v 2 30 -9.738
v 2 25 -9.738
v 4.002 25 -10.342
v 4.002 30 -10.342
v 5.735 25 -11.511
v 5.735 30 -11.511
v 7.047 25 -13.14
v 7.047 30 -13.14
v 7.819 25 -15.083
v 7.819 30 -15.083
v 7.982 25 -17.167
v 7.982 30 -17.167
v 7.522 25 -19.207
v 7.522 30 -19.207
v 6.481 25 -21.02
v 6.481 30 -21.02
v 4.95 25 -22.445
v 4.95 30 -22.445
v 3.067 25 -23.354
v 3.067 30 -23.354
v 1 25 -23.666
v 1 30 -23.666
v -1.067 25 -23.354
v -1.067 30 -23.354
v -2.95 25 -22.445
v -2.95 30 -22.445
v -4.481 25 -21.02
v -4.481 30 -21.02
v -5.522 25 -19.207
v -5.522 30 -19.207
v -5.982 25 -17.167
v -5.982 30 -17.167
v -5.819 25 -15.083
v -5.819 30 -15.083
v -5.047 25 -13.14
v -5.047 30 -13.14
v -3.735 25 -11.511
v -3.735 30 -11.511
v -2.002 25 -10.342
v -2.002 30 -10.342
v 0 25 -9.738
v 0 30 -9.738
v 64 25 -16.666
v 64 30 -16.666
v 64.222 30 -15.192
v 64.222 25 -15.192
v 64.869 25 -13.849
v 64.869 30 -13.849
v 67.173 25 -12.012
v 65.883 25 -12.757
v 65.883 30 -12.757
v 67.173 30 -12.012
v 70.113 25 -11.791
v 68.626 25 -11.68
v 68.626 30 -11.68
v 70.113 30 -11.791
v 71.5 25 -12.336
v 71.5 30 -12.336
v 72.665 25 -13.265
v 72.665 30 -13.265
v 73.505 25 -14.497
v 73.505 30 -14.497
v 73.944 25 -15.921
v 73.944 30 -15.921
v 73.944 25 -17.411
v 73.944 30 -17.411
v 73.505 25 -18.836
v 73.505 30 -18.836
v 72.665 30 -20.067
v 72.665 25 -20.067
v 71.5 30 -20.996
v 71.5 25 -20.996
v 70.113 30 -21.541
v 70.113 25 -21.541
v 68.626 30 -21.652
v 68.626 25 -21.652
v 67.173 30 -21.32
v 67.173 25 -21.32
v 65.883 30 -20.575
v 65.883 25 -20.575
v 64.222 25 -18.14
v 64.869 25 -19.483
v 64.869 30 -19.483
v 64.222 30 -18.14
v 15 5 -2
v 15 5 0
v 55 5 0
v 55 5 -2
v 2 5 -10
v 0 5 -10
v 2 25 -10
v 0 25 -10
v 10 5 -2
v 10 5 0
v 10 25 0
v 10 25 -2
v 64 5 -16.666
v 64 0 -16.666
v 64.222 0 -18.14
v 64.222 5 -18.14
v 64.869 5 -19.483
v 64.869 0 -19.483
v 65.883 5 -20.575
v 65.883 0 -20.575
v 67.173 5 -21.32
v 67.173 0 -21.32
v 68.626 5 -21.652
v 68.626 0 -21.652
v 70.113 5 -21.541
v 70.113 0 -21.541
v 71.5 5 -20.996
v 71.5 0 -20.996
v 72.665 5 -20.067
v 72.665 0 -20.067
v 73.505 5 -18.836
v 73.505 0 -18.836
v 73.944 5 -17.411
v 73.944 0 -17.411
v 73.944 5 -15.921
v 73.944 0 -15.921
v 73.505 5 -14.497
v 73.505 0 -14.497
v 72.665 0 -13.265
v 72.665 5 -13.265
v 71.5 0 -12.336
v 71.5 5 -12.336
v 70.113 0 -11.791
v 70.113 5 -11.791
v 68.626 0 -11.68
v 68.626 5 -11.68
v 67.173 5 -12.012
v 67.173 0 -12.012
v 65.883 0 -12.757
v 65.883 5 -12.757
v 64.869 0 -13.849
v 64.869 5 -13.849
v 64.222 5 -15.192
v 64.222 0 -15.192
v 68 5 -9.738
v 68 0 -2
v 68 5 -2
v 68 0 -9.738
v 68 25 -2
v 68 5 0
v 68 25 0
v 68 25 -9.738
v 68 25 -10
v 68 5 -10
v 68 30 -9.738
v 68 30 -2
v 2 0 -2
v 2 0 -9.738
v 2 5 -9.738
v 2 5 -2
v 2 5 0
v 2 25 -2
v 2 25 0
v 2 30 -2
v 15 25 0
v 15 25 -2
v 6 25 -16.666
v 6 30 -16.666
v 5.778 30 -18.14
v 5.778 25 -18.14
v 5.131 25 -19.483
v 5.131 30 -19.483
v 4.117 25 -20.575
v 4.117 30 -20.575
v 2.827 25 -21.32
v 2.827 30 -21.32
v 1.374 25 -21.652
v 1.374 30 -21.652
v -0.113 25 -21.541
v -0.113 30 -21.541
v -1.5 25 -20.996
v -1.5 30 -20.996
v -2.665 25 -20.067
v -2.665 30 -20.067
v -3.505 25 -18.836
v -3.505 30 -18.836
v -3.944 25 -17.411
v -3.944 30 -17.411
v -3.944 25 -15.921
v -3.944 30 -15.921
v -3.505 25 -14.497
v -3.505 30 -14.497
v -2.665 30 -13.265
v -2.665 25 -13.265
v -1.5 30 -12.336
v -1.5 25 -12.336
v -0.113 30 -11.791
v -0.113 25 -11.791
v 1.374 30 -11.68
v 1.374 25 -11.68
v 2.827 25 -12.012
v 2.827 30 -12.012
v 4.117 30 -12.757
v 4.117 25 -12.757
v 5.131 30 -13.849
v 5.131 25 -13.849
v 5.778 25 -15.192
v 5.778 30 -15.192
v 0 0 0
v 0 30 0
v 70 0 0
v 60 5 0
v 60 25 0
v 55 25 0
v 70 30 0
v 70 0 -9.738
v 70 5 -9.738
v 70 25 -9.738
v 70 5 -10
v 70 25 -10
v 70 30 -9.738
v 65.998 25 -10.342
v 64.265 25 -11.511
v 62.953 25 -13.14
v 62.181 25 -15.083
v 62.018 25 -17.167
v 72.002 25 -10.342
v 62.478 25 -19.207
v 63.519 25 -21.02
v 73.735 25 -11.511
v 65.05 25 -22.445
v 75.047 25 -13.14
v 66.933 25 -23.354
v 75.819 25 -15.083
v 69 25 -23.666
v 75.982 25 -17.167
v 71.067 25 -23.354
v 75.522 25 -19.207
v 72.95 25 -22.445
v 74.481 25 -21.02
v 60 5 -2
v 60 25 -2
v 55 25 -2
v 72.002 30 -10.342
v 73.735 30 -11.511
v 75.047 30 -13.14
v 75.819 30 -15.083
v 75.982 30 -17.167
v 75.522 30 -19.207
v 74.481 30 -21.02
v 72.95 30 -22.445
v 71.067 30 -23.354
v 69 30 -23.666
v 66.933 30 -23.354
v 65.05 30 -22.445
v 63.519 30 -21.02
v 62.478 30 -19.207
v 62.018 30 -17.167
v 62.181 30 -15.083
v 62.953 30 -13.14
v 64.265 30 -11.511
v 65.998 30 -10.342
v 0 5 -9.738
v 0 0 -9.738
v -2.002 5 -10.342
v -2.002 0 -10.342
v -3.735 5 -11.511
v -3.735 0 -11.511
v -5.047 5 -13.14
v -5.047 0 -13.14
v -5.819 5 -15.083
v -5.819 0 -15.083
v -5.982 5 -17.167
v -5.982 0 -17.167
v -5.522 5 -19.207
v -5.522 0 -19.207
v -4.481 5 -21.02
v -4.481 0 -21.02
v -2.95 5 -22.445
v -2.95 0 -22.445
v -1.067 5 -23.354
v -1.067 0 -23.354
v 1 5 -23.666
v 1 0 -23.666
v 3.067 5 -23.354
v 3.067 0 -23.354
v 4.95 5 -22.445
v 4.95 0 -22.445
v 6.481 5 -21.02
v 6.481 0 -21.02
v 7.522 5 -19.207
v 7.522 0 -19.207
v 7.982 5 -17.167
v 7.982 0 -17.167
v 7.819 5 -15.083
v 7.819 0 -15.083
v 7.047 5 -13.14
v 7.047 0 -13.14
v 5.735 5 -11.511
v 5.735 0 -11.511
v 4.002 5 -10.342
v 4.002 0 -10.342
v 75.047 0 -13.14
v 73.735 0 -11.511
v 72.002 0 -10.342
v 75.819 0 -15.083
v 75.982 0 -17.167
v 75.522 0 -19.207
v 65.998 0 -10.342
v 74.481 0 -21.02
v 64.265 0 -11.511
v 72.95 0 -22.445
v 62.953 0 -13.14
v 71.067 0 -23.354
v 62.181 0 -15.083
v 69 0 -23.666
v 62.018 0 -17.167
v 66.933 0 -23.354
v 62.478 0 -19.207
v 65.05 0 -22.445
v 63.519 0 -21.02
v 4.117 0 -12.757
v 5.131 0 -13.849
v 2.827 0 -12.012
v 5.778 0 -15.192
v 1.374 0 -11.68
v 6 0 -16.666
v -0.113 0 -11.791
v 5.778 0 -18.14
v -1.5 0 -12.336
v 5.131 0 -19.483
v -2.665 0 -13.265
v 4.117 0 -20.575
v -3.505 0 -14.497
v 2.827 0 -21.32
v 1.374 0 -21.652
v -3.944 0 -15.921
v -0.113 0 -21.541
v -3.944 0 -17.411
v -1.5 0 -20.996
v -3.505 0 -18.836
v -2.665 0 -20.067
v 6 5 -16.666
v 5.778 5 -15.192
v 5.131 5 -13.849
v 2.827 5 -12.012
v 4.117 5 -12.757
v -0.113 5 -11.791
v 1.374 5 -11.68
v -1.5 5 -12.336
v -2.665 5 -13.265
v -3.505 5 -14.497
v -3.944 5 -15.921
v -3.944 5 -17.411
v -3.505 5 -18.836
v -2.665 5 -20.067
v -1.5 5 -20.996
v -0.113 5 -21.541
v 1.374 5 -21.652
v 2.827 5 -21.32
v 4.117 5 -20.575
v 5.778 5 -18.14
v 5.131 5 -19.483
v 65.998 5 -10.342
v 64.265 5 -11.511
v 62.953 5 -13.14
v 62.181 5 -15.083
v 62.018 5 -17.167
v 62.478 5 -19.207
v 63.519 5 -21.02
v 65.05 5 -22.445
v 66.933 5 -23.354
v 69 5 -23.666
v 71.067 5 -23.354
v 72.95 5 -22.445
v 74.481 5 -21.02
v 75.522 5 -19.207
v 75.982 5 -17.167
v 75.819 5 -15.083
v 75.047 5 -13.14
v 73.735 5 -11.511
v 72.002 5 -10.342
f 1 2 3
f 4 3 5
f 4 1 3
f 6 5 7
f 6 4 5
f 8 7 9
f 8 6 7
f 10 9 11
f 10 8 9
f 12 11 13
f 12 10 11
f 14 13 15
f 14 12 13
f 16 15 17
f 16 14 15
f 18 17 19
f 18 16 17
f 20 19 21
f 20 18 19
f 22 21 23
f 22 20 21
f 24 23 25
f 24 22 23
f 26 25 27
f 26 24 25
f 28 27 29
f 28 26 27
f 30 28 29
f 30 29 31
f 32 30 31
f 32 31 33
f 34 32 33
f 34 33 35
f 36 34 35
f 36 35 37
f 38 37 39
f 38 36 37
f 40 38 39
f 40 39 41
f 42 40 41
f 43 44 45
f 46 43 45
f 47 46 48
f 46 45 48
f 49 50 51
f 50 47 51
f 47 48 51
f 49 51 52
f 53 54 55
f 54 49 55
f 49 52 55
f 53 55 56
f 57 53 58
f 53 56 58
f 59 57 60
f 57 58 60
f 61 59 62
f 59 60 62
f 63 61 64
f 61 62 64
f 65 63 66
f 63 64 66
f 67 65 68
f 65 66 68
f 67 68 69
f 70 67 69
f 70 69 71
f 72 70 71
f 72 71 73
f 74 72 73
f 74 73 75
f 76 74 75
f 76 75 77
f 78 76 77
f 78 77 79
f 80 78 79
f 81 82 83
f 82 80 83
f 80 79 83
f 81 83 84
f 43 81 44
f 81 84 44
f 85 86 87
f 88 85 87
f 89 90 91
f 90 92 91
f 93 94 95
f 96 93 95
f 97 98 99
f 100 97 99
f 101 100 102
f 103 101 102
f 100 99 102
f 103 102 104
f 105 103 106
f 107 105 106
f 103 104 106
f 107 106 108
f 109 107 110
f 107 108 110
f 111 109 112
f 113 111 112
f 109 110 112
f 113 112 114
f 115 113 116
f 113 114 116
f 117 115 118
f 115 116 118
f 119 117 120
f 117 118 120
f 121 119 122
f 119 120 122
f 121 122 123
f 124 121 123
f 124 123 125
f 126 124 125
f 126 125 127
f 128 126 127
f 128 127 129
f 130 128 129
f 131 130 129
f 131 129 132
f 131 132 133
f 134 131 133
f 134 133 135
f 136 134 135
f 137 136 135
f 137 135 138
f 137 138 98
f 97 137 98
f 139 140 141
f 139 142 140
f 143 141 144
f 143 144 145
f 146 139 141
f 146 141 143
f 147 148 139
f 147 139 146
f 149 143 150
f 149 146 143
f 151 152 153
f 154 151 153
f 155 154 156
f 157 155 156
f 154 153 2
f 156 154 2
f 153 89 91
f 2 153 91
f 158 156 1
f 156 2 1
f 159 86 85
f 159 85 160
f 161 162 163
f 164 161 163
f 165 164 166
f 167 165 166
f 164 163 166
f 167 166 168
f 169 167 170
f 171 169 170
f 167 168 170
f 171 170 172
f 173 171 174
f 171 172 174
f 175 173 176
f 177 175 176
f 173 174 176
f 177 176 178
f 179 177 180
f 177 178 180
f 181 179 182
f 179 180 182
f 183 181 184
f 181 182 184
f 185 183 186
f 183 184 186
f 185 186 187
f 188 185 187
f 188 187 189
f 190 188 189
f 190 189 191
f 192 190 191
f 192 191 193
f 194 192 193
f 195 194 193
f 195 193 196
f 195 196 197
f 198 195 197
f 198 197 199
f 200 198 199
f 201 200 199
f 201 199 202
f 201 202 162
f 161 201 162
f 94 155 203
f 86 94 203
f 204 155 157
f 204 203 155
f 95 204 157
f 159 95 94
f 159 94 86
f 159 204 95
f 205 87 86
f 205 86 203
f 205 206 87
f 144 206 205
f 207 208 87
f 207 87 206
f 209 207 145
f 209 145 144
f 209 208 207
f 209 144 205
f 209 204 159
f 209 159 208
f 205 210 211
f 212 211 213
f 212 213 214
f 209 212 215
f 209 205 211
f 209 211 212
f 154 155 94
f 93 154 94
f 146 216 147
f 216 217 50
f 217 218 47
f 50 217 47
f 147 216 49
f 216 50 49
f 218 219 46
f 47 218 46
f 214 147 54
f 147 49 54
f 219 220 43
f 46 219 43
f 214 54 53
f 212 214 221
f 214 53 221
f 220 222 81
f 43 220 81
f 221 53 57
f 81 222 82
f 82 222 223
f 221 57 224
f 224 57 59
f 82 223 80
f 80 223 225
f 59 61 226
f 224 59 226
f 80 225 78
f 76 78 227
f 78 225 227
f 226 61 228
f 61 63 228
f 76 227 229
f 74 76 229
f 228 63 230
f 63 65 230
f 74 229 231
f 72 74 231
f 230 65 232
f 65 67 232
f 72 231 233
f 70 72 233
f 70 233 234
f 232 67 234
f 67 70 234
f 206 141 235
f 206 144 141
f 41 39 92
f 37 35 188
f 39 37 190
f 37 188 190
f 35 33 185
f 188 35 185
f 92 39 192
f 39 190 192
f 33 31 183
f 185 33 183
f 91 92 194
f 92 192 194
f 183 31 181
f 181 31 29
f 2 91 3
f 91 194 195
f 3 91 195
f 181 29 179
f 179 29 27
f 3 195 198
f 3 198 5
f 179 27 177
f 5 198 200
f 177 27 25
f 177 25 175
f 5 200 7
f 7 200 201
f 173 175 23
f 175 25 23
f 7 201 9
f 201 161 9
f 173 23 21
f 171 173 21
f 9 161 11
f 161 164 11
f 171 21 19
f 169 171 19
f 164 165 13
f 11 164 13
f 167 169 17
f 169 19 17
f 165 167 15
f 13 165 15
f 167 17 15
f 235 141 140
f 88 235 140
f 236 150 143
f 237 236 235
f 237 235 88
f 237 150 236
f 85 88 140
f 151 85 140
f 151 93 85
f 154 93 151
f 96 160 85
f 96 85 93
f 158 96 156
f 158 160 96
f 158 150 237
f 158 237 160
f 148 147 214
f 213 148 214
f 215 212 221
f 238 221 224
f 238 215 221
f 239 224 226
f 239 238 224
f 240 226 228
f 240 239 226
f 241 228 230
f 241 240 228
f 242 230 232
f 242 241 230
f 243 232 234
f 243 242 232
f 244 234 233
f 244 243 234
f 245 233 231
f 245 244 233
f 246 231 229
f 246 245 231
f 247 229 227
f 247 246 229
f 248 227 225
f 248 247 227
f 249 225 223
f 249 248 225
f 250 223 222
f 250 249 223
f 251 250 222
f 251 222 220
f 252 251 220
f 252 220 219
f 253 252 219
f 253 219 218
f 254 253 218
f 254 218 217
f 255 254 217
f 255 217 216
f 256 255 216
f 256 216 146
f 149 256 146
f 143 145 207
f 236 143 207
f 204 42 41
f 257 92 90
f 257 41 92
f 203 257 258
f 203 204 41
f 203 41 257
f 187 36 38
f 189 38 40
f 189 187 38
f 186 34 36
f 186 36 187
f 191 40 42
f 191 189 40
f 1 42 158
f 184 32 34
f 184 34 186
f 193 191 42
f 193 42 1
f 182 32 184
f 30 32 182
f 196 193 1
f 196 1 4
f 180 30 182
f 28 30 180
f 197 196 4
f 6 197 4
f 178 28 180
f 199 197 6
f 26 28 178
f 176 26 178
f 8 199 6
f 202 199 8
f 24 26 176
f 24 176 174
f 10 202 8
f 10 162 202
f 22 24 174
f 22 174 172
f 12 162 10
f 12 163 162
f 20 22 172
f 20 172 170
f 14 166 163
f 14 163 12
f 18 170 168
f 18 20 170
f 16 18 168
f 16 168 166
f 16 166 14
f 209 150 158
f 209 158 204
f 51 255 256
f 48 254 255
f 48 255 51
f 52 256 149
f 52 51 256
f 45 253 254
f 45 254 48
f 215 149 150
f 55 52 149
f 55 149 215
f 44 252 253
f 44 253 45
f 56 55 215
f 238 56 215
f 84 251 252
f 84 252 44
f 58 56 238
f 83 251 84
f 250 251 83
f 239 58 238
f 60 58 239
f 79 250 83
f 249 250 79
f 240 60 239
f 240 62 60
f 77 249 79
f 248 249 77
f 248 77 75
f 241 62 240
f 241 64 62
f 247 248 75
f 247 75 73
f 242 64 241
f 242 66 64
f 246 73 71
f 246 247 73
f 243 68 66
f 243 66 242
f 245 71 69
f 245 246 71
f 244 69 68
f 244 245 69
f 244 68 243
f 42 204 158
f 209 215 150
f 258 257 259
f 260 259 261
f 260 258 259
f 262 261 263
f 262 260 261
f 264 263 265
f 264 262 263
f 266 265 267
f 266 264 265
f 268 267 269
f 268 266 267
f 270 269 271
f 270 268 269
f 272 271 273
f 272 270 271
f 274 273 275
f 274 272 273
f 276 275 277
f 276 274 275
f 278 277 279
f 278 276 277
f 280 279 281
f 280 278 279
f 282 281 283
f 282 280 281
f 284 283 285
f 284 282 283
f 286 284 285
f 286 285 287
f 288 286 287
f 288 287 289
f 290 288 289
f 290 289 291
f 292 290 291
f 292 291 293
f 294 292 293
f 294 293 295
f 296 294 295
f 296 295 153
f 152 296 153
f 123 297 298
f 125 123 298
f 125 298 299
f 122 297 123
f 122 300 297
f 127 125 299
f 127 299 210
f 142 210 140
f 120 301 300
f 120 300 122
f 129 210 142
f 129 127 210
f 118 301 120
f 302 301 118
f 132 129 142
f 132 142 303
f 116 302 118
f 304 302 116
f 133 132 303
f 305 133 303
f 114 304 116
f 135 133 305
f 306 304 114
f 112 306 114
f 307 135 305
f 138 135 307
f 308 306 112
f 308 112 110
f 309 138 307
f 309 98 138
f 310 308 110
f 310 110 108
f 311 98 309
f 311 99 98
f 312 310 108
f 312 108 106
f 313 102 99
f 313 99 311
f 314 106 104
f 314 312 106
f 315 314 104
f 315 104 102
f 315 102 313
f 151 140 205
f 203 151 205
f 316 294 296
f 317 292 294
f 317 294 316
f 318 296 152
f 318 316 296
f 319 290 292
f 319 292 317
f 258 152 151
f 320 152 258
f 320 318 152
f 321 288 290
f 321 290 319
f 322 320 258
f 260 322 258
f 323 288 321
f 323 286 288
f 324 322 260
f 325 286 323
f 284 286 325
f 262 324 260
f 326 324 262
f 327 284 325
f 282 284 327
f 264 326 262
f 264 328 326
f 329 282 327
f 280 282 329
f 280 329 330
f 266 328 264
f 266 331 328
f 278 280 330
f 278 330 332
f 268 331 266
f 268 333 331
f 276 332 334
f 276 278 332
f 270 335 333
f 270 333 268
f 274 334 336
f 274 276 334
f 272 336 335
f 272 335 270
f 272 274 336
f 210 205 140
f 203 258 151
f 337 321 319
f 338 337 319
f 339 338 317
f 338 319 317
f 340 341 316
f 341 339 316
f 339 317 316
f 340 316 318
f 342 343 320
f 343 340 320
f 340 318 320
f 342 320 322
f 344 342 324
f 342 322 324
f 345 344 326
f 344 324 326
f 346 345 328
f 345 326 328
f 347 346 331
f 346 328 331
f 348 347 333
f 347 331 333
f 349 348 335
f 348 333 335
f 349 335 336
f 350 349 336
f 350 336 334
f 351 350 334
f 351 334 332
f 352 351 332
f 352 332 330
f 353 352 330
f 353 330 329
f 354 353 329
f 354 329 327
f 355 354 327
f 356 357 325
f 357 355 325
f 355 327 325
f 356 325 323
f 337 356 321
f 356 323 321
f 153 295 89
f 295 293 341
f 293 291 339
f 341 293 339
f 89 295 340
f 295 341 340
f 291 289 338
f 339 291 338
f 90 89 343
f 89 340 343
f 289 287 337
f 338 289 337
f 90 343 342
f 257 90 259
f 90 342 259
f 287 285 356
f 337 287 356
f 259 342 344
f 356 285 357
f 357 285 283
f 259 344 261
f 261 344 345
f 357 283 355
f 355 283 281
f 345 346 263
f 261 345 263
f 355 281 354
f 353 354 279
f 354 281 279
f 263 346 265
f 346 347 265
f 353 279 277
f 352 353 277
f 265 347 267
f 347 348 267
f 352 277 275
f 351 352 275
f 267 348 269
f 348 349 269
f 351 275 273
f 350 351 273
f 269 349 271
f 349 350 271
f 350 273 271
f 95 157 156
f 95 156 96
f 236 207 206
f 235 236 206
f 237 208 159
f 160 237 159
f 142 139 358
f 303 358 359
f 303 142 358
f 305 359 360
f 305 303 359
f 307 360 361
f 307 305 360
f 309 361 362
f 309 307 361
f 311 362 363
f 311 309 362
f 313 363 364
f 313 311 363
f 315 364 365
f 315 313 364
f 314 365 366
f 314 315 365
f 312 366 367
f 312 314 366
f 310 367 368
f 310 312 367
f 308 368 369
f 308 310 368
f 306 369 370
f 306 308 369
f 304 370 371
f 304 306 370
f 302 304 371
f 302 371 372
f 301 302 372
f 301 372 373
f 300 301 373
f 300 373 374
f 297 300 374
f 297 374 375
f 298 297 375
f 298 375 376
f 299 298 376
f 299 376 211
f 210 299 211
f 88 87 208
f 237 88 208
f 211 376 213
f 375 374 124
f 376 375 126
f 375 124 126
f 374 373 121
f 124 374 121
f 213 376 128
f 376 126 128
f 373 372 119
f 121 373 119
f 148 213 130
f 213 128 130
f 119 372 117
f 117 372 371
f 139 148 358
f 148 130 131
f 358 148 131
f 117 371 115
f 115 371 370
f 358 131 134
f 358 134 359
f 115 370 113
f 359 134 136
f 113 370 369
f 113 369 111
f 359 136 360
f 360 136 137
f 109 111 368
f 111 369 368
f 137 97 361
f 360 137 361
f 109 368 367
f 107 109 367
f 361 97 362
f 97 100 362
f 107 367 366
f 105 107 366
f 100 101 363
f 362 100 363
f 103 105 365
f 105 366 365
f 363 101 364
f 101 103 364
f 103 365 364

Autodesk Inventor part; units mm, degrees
ref_plane "YZ Plane" through (0, 0, 0) normal (1, 0, 0) x (0, 1, 0)
sketch "Sketch1" plane through (0, 0, 0) normal (0, 0, 1) x (1, 0, 0)
  line L0 (0, 0) -> (70, 0)
  line L1 (70, 0) -> (70, 30)
  line L2 (70, 30) -> (0, 30)
  line L3 (0, 30) -> (0, 0)
  line L4 (55, 15) -> (55, 25)
  line L5 (55, 25) -> (35, 25)
  line L6 (68, 15) -> (68, 25)
  line L7 (68, 25) -> (60, 25)
  line L8 (60, 25) -> (60, 15)
  line L9 (15, 15) -> (15, 25)
  line L10 (15, 25) -> (35, 25)
  line L11 (2, 15) -> (2, 25)
  line L12 (2, 25) -> (10, 25)
  line L13 (10, 25) -> (10, 15)
  line L14 (55, 15) -> (55, 5)
  line L15 (55, 5) -> (35, 5)
  line L16 (68, 15) -> (68, 5)
  line L17 (68, 5) -> (60, 5)
  line L18 (60, 5) -> (60, 15)
  line L19 (15, 5) -> (35, 5)
  line L20 (15, 15) -> (15, 5)
  line L21 (10, 5) -> (10, 15)
  line L22 (2, 5) -> (10, 5)
  line L23 (2, 15) -> (2, 5)
  dimension "d0" = 70
  dimension "d1" = 30
  dimension "d2" = 20
  dimension "d3" = 10
  dimension "d5" = 8
extrude "Extrusion1" add sketch "Sketch1" against normal blind 10
sketch "Sketch2" plane through (0, 0, -10) normal (0, 0, -1) x (-1, 0, 0)
  line L0 (-70, 30) -> (-70, 0) projected
  line L1 (-70, 30) -> (0, 30)
  line L2 (0, 30) -> (0, 0)
  line L3 (0, 0) -> (-70, 0)
  line L4 (-70, 0) -> (-70, 30)
  line L5 (-68, 28) -> (-68, 2)
  line L6 (-2, 2) -> (-2, 28)
  line L7 (-68, 28) -> (-68, 30)
  line L8 (-70, 30) -> (0, 30) projected
  line L9 (-68, 2) -> (-68, 0)
  line L10 (-2, 2) -> (-2, 0)
  line L11 (-2, 28) -> (-2, 30)
  line L12 (-68, 30) -> (-2, 30)
  line L13 (-2, 30) -> (-2, 0)
  line L14 (-2, 0) -> (-68, 0)
  line L15 (-68, 0) -> (-68, 30)
extrude "Extrusion2" cut sketch "Sketch2" against normal blind 8 contours L1 L11 L6 L10 L3 L9 L5 L7
sketch "Sketch3" plane through (0, 30, 0) normal (0, 1, 0) x (1, 0, 0)
  line L0 (0, 10) -> (2, 10) projected
  circle A0 centre (1, 16.6661) radius 5
  circle A1 centre (1, 16.6661) radius 7
  point P0 (0, 0)
  dimension "d11" = 10
  dimension "d12" = 2
extrude "Extrusion3" add sketch "Sketch3" against normal blind 5
ref_plane "Work Plane1" through (35, 0, 0) normal (-1, 0, 0) x (0, 0, 1)
ref_plane "Work Plane2" through (0, 15, 0) normal (0, 1, 0) x (1, 0, 0)
mirror "Mirror1" about plane through (0, 15, 0) normal (0, 1, 0) of "Extrusion3"
mirror "Mirror2" about plane through (35, 0, 0) normal (-1, 0, 0) of "Extrusion3", "Mirror1"
properties part number "Slider 10mm"
